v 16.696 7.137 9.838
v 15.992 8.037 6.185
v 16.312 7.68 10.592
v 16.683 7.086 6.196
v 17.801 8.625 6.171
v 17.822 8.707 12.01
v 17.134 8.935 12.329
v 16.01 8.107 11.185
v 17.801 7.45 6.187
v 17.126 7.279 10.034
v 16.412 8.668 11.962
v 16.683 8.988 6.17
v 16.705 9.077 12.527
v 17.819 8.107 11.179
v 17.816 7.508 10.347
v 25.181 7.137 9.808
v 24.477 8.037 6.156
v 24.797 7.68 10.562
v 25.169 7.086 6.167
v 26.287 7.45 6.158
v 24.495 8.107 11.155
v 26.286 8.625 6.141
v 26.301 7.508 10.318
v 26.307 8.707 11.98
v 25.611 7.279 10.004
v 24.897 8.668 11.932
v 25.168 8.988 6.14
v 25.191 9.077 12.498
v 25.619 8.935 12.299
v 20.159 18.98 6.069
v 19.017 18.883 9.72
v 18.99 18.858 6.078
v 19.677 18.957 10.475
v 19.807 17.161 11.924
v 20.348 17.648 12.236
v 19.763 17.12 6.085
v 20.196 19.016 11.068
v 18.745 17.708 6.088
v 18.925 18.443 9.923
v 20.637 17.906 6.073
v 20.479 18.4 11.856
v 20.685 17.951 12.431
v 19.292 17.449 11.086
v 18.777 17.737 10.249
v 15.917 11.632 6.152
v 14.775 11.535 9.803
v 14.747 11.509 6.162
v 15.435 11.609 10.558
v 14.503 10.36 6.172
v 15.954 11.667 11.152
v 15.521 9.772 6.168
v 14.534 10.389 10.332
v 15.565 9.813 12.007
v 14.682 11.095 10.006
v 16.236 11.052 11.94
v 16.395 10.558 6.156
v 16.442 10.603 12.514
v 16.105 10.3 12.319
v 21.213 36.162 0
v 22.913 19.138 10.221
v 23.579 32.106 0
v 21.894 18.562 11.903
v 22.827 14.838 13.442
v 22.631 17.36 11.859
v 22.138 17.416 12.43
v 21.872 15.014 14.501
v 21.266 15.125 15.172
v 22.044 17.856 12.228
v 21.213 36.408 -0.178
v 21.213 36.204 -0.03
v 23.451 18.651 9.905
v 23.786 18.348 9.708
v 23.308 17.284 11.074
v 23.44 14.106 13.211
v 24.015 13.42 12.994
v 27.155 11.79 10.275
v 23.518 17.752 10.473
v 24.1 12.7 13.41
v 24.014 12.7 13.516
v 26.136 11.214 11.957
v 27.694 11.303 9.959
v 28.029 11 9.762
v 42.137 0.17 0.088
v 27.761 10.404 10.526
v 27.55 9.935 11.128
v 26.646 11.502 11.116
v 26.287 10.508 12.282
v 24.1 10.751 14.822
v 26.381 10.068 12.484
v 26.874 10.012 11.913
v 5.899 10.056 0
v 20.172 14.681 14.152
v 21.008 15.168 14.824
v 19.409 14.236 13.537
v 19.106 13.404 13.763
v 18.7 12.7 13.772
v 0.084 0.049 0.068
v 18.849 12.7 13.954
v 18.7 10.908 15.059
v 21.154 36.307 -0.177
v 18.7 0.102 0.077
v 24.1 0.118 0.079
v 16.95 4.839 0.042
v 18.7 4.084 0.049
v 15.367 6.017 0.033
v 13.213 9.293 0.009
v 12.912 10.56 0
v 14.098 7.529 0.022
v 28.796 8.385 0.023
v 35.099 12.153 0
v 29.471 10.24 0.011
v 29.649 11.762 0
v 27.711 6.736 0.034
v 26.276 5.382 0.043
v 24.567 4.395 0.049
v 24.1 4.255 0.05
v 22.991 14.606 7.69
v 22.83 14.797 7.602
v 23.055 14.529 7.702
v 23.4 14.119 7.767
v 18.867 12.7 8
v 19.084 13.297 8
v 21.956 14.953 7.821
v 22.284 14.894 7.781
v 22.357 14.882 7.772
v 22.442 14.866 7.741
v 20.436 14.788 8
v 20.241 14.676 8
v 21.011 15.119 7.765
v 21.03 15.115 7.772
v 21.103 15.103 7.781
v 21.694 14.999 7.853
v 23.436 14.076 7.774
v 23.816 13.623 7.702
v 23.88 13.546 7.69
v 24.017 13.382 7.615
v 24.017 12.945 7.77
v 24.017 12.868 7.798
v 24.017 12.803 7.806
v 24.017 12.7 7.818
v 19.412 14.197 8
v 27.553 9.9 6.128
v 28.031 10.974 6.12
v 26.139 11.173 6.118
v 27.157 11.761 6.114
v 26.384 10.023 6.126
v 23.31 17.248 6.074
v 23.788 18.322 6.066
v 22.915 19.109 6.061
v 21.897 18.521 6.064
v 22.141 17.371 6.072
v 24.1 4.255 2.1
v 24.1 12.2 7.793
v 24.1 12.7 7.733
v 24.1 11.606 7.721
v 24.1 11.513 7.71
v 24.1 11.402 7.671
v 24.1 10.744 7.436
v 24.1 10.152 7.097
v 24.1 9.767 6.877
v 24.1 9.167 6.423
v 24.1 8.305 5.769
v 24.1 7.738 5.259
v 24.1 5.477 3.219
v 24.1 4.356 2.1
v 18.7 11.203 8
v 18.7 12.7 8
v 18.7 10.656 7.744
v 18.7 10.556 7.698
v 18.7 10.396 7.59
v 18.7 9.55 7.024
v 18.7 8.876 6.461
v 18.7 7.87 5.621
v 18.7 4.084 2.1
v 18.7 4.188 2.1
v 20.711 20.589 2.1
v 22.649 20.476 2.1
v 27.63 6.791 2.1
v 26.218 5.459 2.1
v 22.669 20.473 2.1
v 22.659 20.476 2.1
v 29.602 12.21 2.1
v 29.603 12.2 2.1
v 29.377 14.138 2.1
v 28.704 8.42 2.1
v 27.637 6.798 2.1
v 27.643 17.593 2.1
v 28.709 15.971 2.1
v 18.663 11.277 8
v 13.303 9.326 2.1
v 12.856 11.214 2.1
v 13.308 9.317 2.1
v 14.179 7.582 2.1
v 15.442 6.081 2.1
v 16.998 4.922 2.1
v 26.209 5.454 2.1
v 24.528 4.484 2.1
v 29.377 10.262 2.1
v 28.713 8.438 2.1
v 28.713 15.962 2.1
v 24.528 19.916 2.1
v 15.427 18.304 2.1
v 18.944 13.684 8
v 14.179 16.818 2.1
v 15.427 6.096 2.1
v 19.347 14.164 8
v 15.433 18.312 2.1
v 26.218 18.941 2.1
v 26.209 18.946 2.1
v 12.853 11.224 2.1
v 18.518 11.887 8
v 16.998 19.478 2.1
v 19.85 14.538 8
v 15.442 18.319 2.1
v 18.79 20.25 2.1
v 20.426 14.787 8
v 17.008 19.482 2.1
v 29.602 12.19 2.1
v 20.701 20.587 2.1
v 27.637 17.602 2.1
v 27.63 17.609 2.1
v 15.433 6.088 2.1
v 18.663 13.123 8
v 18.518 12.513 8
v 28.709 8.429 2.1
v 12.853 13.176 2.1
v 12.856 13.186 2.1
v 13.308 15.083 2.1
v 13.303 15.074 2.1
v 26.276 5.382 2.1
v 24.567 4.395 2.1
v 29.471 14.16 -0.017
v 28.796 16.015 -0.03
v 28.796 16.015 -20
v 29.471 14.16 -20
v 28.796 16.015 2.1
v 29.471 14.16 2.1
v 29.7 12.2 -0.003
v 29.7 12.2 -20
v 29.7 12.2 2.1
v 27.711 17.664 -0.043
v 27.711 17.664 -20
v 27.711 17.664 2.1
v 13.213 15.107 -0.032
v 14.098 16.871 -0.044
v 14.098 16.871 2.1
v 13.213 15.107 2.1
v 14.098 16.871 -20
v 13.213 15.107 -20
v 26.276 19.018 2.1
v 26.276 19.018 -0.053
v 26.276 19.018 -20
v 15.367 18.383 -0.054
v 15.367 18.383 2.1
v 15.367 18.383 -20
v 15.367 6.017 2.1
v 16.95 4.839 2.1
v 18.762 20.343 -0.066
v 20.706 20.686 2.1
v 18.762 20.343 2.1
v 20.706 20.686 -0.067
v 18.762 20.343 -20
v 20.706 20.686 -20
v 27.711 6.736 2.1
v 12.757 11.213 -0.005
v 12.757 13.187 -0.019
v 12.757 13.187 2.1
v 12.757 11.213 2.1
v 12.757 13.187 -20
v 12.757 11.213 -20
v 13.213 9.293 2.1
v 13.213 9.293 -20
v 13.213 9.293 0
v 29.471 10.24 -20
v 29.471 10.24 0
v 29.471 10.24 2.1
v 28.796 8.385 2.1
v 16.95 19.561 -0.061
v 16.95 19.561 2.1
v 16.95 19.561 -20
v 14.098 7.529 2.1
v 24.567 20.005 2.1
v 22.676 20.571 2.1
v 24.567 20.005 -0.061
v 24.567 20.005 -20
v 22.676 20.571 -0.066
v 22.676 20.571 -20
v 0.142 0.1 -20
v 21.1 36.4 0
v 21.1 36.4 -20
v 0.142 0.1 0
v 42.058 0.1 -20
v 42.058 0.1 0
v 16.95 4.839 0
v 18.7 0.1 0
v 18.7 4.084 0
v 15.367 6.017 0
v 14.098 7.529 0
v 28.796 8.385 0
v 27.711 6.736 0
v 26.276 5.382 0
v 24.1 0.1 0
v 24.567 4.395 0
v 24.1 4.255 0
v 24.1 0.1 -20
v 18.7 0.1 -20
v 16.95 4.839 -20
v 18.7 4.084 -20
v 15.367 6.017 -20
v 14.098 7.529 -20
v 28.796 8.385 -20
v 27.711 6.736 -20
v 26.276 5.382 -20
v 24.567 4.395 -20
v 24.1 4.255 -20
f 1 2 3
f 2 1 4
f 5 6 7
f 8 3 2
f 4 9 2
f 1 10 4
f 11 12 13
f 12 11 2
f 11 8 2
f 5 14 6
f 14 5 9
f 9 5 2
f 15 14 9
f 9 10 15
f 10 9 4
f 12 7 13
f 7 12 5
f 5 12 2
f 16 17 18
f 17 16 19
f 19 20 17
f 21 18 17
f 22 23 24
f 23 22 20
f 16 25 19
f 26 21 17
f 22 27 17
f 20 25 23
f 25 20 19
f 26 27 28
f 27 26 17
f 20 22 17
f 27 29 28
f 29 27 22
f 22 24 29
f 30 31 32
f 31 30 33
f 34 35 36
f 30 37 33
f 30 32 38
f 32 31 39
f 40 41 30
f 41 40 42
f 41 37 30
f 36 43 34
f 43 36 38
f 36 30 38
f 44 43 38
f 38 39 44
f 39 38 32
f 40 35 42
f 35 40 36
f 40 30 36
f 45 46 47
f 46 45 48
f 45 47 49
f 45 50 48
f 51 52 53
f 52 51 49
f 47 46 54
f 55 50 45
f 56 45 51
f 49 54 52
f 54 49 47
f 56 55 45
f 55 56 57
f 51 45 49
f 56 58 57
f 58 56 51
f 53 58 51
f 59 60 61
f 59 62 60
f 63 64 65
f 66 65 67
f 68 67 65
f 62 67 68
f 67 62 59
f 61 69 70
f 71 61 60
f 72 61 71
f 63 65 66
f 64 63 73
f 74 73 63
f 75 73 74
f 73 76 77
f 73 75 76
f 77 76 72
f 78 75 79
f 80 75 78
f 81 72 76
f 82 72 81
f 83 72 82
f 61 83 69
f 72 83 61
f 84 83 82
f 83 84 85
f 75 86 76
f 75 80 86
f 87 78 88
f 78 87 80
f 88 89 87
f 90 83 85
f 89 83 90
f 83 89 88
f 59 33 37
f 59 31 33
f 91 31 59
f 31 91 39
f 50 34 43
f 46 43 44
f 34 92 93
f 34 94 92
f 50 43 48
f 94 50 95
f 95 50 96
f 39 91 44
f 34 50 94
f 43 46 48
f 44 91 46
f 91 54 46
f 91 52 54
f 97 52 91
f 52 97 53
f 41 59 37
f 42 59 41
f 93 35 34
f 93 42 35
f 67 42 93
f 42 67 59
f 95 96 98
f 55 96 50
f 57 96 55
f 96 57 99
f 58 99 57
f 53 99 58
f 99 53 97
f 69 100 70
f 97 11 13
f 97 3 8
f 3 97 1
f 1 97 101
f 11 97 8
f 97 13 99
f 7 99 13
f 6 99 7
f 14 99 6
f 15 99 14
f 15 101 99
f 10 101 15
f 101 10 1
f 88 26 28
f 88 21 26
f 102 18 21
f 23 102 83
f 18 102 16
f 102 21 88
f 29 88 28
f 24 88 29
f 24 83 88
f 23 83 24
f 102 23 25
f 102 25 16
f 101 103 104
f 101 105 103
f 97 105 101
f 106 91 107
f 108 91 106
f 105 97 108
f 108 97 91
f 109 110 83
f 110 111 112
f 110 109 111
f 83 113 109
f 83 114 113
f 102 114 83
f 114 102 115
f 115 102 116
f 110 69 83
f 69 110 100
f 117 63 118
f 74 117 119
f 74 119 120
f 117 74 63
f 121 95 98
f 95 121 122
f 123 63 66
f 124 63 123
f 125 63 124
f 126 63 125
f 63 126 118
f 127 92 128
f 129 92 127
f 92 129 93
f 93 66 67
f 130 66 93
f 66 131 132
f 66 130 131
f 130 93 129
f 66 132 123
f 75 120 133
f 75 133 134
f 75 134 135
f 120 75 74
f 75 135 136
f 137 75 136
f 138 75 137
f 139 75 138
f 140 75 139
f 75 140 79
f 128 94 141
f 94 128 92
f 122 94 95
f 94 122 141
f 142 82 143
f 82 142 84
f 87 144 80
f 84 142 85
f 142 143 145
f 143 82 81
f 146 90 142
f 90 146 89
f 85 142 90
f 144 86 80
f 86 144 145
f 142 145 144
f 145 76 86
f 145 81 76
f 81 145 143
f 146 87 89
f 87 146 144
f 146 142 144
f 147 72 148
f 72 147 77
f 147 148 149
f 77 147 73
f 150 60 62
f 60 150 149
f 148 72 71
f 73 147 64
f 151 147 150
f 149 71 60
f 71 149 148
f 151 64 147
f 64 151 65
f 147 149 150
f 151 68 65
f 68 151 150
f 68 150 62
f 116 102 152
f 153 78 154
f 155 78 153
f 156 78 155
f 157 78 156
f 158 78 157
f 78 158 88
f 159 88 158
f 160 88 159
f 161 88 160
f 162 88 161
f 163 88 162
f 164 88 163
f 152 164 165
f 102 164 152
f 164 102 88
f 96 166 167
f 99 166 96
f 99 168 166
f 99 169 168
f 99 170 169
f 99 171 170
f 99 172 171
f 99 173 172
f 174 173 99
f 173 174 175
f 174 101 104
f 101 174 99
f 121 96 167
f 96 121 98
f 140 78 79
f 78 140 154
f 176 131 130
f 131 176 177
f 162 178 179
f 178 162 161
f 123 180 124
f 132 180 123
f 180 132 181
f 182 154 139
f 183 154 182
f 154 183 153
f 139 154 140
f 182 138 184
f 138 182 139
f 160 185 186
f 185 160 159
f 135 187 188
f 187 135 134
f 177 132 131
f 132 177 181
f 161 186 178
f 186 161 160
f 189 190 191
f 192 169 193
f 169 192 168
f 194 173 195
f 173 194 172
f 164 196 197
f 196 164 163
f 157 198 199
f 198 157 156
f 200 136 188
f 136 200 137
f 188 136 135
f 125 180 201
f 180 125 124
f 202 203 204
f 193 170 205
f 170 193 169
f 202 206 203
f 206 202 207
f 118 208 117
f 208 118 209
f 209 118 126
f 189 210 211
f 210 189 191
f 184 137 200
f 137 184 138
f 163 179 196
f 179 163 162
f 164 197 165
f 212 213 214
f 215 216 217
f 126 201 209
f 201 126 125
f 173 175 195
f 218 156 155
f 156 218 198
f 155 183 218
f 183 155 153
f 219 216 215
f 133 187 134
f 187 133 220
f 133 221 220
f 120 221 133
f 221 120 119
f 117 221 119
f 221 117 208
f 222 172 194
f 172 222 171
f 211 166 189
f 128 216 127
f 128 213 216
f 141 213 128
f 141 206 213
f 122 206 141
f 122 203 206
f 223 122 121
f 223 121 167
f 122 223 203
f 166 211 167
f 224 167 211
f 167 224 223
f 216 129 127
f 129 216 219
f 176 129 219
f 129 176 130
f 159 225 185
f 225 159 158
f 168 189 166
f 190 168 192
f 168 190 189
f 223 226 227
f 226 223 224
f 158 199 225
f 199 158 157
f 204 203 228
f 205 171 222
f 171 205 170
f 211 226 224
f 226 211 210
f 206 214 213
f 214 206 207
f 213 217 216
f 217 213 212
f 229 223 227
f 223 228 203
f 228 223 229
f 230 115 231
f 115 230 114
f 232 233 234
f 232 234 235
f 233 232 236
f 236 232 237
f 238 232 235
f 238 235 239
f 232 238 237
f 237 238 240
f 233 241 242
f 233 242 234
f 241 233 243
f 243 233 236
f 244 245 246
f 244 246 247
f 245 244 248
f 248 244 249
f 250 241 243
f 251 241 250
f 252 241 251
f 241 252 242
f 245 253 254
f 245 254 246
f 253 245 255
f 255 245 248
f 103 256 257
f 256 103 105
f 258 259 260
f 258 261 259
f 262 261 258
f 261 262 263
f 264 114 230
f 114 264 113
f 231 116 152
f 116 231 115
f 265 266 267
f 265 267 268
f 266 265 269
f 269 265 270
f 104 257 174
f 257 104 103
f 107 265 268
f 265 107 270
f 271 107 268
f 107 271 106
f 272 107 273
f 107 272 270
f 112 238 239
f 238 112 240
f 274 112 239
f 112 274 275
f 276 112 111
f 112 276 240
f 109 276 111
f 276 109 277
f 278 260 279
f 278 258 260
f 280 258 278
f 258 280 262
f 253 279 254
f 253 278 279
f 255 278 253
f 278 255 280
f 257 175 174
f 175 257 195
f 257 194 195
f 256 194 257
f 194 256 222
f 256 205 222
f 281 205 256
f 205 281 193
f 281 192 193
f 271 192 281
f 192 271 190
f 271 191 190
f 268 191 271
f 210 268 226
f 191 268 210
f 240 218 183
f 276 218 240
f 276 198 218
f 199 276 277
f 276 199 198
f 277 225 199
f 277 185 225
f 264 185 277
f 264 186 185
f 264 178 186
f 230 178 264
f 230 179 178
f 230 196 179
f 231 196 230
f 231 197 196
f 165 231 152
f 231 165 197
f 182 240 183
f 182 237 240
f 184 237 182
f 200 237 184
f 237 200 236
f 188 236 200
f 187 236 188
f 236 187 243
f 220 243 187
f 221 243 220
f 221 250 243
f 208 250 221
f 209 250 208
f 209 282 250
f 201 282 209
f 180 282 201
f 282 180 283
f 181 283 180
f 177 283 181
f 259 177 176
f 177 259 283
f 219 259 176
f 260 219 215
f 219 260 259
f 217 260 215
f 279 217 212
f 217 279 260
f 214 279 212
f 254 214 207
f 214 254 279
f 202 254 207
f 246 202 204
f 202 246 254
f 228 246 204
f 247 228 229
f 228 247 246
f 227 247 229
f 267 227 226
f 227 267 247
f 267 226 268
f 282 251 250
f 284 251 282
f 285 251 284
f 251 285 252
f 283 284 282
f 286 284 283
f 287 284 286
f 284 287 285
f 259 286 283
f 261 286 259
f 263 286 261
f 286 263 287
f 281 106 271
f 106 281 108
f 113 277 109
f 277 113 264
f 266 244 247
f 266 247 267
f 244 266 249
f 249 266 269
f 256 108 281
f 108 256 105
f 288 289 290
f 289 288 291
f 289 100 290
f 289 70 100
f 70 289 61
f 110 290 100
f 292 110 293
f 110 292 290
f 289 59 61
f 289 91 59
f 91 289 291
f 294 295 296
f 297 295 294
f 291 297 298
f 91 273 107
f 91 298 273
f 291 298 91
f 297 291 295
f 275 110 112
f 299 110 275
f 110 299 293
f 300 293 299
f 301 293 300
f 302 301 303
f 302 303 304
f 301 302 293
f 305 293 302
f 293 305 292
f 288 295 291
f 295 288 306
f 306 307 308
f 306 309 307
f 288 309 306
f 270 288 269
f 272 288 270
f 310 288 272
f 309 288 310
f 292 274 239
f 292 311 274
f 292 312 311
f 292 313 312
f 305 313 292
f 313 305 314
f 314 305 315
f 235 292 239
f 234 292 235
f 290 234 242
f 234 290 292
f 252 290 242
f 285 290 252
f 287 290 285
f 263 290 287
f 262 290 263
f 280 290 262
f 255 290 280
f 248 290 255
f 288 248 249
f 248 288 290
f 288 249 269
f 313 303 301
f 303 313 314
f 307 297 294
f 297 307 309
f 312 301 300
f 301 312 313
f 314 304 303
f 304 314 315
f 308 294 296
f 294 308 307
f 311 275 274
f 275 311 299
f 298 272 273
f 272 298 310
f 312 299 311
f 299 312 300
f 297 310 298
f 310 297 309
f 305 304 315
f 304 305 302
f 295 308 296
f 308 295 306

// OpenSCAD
depth=10;
difference() {
    rotate([.2,.2,0])
rotate([-36,0,0])
rotate([0,45,0]) {
difference(){
cube(30);
    translate([-depth-1,-depth-1,30])
        translate([30,-20,-42])
    rotate([0,35,45])
    cube(70);
    
    translate([depth+depth+depth+1.2,depth+depth+depth+1.2,0])
rotate([55,0,-45])
translate([0,-.5,-28])
cylinder(150,2.7,2.7);
    


translate([.2+8,.2+2,30])
rotate([55,0,-45])
translate([0,0,-5])
cylinder(10,1,1);

translate([.2+2,.2+8,30])
rotate([55,0,-45])
translate([0,0,-5])
cylinder(10,1,1);

translate([0,30,30])
rotate([0,90,-90]) {
translate([.2+8,.2+2,30])
rotate([55,0,-45])
translate([0,0,-5])
cylinder(10,1,1);

translate([.2+2,.2+8,30])
rotate([55,0,-45])
translate([0,0,-5])
cylinder(10,1,1);
}


translate([30,0,30])
rotate([-90,0,90]) {
translate([.2+8,.2+2,30])
rotate([55,0,-45])
translate([0,0,-5])
cylinder(10,1,1);

translate([.2+2,.2+8,30])
rotate([55,0,-45])
translate([0,0,-5])
cylinder(10,1,1);
}

    
}
}


translate([18.7,-7.3,-1])
cube([5.4,20,20]);

translate([21.2,12.2,2])
cylinder(6,8.5,2.7);

translate([21.2,12.2,-3.9])
cylinder(6,8.5,8.5);



}

translate([0,0,0])
difference() {
translate([21.1,12.2,-20])
rotate([0,0,-30])
cylinder(20, 24.2, 24.2, $fn=3);
    
    
translate([21.2,12.2,-21])
    cylinder(22, 8.5, 8.5);
    
translate([18.7,-7.3,-21])
cube([5.4,20,22]);
}
